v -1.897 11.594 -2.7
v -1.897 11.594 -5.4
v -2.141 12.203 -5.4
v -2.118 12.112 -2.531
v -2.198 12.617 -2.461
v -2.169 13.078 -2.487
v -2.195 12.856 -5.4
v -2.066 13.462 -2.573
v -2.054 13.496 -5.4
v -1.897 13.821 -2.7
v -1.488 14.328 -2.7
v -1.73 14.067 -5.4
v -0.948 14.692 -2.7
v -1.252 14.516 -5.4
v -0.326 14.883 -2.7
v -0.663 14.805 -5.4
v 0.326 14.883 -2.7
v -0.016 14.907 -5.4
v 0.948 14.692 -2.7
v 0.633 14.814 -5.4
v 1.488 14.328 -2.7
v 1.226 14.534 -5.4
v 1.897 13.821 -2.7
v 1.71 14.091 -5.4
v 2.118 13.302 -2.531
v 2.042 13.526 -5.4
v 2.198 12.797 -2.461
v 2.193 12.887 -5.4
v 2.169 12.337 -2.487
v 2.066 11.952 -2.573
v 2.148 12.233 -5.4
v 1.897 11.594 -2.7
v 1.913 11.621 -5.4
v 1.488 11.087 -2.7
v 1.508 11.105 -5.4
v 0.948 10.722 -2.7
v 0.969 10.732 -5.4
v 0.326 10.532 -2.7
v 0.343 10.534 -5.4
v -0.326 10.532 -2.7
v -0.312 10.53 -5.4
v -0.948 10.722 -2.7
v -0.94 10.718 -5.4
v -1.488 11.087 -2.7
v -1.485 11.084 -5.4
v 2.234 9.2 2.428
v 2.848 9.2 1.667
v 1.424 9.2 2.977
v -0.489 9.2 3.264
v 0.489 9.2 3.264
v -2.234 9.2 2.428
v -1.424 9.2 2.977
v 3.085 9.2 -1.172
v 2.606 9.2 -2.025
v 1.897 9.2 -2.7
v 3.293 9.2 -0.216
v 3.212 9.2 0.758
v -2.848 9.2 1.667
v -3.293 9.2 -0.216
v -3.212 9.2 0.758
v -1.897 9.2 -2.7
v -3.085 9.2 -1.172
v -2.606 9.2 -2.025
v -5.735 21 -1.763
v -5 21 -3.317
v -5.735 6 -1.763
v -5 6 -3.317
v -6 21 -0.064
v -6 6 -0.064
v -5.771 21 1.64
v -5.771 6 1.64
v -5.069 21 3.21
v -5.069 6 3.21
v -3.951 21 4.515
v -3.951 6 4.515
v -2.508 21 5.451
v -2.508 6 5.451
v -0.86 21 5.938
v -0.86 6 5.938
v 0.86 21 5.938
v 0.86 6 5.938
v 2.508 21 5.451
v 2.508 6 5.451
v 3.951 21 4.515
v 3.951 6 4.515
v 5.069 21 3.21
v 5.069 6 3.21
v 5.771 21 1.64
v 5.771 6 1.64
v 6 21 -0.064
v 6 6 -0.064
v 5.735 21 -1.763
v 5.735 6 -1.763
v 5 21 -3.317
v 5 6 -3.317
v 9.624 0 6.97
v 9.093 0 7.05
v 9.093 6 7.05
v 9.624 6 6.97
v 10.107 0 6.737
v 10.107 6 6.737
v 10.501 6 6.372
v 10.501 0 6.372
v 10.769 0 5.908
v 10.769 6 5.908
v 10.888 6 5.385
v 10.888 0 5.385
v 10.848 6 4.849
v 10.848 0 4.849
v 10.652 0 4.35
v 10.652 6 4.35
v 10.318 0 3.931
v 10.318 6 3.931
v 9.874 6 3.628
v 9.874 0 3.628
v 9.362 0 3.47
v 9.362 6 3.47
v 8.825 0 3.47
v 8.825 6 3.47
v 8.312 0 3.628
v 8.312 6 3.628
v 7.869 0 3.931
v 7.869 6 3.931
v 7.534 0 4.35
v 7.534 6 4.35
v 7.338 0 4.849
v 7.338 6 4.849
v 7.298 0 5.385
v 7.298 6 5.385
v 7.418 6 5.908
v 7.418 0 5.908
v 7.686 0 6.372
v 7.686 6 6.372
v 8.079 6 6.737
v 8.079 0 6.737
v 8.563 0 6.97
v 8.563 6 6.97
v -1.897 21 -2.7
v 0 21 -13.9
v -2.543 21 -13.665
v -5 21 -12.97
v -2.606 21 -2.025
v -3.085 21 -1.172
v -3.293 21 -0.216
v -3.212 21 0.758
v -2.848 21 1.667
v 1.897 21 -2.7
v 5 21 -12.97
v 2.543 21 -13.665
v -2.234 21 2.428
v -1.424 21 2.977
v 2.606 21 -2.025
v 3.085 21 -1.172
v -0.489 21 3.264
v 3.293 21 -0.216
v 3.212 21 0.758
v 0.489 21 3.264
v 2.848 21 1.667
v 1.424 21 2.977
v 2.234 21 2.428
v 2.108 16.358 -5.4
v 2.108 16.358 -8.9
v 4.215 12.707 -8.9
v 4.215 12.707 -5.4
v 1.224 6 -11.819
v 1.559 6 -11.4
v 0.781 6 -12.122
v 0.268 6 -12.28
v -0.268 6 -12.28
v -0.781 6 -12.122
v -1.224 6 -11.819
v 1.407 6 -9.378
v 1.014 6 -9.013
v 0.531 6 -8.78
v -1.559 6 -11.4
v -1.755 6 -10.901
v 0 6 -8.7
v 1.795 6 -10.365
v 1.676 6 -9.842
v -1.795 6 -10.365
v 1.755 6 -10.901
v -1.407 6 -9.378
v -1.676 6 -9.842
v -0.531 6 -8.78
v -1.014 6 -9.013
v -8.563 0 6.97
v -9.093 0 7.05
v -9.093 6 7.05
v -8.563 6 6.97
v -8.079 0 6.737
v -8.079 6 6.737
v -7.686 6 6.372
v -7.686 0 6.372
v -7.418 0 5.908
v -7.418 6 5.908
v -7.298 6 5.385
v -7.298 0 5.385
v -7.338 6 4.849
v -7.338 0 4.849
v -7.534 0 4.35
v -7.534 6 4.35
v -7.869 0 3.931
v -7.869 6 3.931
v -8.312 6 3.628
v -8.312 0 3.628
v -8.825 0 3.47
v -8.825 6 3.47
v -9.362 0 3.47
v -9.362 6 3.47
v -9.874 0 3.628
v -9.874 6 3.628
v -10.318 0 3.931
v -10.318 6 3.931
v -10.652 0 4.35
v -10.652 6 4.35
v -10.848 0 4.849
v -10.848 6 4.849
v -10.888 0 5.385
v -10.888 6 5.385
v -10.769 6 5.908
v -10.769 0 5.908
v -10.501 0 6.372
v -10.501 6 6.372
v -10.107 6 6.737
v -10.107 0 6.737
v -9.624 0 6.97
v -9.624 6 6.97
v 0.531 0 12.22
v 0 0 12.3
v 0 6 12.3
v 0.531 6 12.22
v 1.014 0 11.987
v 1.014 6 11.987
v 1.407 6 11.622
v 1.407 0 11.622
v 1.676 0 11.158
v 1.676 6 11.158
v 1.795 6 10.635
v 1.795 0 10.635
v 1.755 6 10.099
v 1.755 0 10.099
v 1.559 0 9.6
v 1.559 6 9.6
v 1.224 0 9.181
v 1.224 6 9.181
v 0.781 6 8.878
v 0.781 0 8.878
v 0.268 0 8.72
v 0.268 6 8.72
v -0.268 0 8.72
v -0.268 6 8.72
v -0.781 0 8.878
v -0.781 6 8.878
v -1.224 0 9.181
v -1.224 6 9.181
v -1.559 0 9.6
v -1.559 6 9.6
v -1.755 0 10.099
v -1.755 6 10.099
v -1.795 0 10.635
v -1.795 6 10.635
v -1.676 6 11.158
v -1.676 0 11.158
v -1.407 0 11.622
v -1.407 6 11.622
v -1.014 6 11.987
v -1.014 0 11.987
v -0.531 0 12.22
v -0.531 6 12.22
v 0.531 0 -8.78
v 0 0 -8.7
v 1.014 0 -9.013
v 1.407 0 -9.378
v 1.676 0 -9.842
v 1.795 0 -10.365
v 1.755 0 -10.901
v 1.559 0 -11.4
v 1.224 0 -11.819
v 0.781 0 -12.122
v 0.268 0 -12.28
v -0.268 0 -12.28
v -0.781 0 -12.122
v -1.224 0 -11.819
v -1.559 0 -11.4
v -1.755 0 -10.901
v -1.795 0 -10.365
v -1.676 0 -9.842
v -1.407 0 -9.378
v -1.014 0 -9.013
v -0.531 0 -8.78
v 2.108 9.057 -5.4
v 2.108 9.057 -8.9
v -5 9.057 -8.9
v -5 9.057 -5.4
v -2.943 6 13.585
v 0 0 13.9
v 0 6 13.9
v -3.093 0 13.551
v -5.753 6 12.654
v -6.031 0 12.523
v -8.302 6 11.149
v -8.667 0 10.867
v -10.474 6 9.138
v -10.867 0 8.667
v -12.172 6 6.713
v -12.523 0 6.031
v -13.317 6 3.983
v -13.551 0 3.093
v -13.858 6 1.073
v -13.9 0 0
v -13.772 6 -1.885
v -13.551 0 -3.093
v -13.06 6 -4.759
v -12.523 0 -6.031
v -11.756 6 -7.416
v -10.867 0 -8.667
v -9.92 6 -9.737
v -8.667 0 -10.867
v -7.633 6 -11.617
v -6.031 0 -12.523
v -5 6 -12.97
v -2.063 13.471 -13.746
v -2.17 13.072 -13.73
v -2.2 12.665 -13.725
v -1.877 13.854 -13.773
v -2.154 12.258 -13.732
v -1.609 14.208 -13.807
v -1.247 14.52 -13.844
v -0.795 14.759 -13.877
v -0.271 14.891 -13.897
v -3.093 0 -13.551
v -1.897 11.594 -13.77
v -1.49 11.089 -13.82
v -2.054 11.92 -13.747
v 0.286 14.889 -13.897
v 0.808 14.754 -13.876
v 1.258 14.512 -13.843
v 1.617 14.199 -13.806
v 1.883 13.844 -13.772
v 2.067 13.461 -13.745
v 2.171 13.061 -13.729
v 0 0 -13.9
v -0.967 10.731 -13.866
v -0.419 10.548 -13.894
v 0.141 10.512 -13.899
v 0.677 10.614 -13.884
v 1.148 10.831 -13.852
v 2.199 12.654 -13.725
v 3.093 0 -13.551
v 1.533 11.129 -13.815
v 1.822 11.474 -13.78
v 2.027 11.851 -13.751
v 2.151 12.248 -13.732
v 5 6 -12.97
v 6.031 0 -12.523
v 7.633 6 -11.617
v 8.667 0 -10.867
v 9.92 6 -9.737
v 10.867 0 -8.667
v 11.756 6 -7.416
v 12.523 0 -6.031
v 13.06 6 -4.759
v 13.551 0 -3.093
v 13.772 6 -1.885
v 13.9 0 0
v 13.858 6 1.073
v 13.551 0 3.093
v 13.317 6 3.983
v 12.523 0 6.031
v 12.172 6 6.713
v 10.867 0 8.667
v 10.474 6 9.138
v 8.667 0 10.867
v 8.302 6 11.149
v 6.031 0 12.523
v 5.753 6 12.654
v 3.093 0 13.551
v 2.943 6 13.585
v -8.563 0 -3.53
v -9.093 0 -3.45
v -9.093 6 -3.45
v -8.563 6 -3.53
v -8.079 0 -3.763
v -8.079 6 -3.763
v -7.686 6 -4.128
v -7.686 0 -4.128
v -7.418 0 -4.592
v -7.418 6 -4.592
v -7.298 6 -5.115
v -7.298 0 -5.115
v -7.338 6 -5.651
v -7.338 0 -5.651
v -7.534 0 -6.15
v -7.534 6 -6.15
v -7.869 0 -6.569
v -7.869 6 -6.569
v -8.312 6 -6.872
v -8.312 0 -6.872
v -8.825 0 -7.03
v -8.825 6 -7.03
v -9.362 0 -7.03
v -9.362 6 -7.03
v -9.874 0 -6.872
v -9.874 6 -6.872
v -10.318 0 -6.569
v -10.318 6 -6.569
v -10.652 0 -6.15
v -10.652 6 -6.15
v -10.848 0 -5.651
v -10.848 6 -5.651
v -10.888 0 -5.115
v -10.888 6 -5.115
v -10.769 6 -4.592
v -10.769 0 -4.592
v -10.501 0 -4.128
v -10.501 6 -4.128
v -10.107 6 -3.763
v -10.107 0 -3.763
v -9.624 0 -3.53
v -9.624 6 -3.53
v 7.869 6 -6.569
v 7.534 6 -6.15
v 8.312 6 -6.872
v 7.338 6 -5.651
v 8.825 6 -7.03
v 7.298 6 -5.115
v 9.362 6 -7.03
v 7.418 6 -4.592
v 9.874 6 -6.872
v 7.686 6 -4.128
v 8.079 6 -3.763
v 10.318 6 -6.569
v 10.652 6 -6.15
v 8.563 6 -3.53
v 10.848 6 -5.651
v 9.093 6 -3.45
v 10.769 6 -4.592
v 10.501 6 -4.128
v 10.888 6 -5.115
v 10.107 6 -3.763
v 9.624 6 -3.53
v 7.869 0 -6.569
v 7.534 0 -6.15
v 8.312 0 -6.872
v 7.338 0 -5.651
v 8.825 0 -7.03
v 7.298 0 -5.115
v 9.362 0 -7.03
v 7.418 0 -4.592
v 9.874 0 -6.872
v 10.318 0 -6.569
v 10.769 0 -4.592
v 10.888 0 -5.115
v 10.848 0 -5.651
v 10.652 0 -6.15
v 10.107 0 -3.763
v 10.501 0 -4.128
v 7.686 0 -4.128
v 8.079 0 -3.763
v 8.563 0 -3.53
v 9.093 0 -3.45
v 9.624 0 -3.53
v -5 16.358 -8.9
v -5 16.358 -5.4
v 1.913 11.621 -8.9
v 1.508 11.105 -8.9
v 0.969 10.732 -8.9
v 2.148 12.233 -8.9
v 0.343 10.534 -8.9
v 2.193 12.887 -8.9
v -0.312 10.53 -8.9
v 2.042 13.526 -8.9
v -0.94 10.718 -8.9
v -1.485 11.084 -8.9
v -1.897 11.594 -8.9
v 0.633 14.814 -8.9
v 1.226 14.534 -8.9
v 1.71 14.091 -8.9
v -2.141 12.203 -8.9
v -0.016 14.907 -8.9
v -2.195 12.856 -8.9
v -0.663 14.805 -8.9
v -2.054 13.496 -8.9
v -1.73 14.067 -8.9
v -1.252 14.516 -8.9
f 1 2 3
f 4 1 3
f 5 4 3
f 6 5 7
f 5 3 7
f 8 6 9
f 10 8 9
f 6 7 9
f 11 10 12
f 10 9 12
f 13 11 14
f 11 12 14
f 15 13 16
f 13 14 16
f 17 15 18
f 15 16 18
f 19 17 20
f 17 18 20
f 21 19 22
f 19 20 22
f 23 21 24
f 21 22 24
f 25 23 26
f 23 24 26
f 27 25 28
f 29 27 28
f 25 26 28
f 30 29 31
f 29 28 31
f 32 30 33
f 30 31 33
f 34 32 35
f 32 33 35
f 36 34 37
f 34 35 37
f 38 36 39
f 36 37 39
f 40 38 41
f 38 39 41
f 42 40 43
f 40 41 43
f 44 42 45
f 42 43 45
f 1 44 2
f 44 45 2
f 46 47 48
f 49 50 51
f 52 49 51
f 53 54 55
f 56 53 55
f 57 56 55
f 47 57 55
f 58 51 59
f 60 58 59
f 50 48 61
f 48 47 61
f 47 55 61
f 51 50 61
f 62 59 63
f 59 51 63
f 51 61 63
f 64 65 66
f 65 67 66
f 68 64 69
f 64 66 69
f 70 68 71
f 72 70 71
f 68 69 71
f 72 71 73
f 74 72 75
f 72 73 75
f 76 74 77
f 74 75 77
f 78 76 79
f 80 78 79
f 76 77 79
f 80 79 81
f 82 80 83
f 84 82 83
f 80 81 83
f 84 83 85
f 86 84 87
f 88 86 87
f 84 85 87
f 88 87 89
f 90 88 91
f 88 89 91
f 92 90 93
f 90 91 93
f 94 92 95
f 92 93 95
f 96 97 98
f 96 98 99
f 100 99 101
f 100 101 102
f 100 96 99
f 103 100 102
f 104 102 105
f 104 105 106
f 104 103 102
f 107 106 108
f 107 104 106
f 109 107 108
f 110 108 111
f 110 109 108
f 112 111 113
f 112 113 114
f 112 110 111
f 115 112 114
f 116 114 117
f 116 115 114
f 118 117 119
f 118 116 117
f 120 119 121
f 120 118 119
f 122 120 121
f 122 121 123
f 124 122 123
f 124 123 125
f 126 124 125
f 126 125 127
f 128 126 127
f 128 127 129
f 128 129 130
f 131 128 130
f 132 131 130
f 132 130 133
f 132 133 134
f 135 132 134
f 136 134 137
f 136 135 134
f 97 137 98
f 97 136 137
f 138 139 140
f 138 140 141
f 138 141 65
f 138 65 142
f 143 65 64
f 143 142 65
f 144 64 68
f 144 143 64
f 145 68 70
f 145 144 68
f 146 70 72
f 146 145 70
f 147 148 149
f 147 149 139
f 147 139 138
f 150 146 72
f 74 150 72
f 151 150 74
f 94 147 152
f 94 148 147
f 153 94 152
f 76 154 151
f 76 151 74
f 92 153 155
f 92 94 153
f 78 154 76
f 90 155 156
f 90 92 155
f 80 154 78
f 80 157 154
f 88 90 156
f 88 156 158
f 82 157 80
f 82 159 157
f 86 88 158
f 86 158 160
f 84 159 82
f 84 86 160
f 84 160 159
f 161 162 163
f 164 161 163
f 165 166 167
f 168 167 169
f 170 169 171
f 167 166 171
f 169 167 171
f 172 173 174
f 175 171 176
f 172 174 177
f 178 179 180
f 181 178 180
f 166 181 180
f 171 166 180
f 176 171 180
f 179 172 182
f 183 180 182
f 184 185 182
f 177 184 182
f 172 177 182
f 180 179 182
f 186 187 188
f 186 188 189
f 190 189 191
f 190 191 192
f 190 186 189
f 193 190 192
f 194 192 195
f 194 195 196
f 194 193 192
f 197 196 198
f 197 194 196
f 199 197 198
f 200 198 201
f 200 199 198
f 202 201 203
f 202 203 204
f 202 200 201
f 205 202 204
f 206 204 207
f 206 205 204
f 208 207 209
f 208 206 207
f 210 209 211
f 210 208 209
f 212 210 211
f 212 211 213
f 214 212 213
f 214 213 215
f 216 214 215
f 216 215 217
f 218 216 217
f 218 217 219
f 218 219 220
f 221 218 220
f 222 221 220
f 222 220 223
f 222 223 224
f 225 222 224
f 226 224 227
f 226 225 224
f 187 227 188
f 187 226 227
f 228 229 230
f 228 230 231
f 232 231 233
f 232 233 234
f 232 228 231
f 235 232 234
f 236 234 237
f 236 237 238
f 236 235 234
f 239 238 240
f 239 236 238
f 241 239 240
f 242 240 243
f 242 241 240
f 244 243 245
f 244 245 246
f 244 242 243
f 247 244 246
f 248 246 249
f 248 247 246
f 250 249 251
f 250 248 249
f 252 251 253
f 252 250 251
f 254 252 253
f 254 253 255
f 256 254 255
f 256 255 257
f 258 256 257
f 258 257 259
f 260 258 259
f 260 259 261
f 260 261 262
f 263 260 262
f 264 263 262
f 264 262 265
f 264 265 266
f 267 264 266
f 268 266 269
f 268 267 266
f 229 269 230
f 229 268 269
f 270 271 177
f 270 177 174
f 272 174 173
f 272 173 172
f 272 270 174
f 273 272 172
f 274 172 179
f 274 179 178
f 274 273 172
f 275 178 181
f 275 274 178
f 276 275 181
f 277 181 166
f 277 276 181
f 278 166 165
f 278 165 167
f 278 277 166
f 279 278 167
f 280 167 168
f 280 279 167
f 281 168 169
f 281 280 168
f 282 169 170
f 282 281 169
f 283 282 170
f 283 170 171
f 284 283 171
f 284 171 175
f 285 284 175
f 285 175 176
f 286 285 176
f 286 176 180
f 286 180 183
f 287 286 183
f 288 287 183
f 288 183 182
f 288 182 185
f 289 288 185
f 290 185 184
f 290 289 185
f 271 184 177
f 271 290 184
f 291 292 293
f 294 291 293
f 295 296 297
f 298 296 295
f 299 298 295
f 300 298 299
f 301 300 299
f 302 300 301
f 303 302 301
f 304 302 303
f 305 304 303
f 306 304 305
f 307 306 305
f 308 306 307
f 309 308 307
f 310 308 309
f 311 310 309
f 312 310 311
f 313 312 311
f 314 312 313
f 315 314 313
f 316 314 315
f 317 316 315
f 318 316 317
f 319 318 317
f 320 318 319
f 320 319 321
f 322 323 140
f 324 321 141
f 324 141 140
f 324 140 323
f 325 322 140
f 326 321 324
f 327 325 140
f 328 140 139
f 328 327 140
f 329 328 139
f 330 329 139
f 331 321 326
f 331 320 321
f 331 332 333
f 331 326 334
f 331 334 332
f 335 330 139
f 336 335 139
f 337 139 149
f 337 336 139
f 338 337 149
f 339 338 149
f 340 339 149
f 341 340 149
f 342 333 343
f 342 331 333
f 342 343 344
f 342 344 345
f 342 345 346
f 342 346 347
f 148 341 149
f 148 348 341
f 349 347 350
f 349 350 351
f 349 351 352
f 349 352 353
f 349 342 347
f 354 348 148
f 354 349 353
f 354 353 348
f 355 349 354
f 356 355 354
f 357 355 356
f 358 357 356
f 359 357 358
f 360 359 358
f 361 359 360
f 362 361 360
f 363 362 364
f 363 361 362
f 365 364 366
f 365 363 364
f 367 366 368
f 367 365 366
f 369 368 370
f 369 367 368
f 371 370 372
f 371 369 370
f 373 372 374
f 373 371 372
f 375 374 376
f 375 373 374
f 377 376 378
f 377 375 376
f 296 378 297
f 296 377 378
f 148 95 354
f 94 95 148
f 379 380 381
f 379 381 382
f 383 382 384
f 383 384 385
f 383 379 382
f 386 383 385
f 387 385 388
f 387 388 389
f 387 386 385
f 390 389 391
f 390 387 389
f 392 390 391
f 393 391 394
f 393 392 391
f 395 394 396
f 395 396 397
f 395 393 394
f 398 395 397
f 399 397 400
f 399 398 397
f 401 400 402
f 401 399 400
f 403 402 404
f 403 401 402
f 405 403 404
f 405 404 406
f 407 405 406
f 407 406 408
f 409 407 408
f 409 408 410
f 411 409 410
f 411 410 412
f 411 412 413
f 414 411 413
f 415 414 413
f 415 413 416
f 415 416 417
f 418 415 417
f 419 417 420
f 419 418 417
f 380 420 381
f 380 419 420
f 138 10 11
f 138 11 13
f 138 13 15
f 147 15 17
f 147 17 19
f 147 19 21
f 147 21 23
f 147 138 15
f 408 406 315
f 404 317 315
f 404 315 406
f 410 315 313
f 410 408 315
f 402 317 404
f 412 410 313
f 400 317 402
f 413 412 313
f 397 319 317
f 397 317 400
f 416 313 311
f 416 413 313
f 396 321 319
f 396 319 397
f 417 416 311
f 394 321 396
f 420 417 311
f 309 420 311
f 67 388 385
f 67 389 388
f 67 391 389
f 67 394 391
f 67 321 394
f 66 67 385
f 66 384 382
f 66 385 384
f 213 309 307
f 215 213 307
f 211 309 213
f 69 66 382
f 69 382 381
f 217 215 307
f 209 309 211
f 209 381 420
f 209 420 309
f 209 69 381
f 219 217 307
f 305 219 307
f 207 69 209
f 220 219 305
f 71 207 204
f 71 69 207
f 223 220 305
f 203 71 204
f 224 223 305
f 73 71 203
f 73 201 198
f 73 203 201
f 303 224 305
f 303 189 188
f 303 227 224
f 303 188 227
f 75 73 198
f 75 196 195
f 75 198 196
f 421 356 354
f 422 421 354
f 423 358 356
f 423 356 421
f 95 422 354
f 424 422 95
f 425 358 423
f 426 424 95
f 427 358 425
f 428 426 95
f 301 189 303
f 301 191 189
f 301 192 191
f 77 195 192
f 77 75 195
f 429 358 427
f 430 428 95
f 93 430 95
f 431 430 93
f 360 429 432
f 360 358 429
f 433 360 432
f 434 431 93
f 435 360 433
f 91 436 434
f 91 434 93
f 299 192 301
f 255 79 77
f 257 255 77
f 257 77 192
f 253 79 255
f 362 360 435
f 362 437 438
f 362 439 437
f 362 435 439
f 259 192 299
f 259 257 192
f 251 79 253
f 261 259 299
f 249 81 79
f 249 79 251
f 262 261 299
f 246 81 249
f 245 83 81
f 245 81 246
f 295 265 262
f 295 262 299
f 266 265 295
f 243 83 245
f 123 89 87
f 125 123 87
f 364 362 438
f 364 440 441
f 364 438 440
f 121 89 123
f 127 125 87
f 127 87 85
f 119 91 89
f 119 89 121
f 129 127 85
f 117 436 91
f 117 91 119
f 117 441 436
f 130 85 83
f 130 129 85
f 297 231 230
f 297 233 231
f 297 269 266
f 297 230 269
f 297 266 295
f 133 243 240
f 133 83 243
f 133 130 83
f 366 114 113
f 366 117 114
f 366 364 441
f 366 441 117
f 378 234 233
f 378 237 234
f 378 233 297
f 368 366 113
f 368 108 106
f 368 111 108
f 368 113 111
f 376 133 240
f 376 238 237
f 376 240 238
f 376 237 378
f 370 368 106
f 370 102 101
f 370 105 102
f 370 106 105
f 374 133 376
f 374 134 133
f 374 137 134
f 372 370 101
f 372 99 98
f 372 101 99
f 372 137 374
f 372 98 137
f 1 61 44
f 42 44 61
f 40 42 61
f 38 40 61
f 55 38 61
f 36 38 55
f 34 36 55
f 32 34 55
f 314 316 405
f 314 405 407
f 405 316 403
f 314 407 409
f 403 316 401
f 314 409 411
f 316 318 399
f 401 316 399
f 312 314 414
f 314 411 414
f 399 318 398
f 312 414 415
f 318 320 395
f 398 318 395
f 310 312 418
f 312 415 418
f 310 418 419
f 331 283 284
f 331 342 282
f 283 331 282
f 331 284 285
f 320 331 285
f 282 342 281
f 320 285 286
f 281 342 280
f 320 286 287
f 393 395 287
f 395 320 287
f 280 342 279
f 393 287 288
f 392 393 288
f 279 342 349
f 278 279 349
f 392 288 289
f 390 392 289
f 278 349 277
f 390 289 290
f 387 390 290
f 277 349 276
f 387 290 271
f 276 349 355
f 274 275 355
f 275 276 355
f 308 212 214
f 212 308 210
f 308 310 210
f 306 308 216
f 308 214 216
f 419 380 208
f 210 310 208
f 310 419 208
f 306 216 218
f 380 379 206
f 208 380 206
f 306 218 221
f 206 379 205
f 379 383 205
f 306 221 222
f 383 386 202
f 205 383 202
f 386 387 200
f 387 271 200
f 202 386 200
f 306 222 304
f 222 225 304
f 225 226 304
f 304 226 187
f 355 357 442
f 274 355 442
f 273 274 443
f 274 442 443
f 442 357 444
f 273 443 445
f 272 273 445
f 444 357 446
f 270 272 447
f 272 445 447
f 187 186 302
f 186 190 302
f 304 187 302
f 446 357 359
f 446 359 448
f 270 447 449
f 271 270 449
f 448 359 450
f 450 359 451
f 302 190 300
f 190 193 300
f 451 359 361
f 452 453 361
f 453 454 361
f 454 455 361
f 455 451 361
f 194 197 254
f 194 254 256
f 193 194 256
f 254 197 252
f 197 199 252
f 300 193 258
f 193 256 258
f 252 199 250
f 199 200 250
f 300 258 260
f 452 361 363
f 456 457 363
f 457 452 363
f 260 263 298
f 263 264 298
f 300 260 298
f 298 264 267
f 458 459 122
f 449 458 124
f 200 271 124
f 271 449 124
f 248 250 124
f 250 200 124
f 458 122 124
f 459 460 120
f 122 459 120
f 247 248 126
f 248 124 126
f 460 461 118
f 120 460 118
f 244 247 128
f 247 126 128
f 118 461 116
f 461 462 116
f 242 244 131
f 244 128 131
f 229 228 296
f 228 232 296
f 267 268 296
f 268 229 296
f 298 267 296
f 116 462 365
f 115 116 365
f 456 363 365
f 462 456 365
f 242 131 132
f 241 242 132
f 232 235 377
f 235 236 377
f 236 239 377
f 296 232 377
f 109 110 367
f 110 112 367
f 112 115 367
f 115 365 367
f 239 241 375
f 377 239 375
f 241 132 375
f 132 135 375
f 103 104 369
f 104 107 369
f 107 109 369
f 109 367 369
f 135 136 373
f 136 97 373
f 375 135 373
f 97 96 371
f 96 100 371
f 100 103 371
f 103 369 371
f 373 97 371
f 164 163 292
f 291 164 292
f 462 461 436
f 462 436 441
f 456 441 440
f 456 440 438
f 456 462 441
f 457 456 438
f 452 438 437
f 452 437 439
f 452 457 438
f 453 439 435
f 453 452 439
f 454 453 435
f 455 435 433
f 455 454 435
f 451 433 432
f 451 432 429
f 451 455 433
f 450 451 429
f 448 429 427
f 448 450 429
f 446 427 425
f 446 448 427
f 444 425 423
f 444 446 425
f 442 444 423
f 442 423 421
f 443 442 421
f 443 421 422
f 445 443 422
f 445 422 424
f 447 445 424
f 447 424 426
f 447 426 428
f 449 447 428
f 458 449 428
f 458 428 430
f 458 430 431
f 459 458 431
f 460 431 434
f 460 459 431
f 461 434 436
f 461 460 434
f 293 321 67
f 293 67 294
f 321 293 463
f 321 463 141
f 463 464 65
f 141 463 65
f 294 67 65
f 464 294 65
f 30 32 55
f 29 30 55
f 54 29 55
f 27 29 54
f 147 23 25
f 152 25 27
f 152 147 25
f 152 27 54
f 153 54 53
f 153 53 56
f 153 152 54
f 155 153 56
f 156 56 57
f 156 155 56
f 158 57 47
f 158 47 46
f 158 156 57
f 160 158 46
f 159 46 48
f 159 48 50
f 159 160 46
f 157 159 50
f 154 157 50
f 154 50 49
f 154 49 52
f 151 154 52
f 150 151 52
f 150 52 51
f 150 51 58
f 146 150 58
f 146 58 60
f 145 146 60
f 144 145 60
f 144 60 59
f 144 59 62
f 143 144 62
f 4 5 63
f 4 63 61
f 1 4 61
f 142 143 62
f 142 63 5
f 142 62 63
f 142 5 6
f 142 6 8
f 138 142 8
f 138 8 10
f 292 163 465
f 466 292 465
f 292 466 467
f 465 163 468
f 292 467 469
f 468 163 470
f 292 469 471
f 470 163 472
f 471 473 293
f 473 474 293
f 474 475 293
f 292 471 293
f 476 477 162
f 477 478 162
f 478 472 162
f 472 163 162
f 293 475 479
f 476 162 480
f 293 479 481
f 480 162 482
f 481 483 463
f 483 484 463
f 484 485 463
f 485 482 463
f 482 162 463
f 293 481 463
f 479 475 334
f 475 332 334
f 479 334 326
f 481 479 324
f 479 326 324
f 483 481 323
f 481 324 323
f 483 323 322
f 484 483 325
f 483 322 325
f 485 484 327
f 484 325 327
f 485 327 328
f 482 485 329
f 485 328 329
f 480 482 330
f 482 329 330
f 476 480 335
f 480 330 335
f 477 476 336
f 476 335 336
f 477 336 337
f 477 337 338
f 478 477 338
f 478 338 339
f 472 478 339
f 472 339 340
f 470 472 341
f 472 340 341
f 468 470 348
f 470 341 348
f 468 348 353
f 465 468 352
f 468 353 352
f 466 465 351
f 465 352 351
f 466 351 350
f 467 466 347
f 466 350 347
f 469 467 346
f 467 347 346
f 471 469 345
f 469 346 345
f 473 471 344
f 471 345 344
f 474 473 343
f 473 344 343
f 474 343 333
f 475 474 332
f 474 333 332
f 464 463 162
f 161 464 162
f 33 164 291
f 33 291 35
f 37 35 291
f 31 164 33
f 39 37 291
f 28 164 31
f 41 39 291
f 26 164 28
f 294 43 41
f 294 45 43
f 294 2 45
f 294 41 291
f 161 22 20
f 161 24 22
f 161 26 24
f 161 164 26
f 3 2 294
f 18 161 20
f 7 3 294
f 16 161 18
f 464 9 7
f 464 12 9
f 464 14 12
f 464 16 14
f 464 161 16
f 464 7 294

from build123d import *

# Parameters (mm, degrees)
ESQUISSE3_R             = 13.9
ESQUISSE3_R_2           = 1.8
BOSS_EXTRU_1_DEPTH      = 6
ESQUISSE5_R             = 6
BOSS_EXTRU_2_DEPTH      = 15
ENL_V_MAT_EXTRU_2_DEPTH = 11.8
BOSS_EXTRU_3_REACH      = 37.097
BOSS_EXTRU_3_END_RADIUS = 13.9
BOSS_EXTRU_3_START      = -3
ESQUISSE7_W             = 10
ESQUISSE7_H             = 15
ESQUISSE11_R            = 2.2
ENL_V_MAT_EXTRU_3_DEPTH = 14
ENL_V_START             = -5
ENL_V_MAT_EXTRU_4_DEPTH = 3.5


with BuildPart() as part:
    # Esquisse3 → Boss.-Extru.1 (new body)
    with BuildSketch(Plane(origin=(0, 0, 0), x_dir=(1, 0, 0), z_dir=(0, 1, 0))):
        with Locations(Location((0, 0, 0), (0, 0, 270))):
            Circle(ESQUISSE3_R)
        with Locations(Location((0, 10.5, 0), (0, 0, 270))):
            Circle(ESQUISSE3_R_2, mode=Mode.SUBTRACT)
        with Locations(Location((9.09326674, 5.25, 0), (0, 0, 270))):
            Circle(ESQUISSE3_R_2, mode=Mode.SUBTRACT)
        with Locations(Location((9.09326674, -5.25, 0), (0, 0, 270))):
            Circle(ESQUISSE3_R_2, mode=Mode.SUBTRACT)
        with Locations(Location((0, -10.5, 0), (0, 0, 270))):
            Circle(ESQUISSE3_R_2, mode=Mode.SUBTRACT)
        with Locations(Location((-9.09326674, -5.25, 0), (0, 0, 270))):
            Circle(ESQUISSE3_R_2, mode=Mode.SUBTRACT)
        with Locations(Location((-9.09326674, 5.25, 0), (0, 0, 270))):
            Circle(ESQUISSE3_R_2, mode=Mode.SUBTRACT)
    extrude(amount=BOSS_EXTRU_1_DEPTH)

    # Esquisse5 → Boss.-Extru.2 (add)
    with BuildSketch(Plane(origin=(0, 6, 0), x_dir=(1, 0, 0), z_dir=(0, 1, 0))):
        with Locations(Location((0, 0, 0), (0, 0, 270))):
            Circle(ESQUISSE5_R)
    extrude(amount=BOSS_EXTRU_2_DEPTH)

    # Esquisse6 → Enlèv. mat.-Extru.2 (cut)
    with BuildSketch(Plane(origin=(0, 21, 0), x_dir=(1, 0, 0), z_dir=(0, 1, 0))):
        with BuildLine():
            Line((-1.897366596, 2.7), (1.897366596, 2.7))
            ThreePointArc((1.897366596, 2.7), (0, -3.3), (-1.897366596, 2.7))
        make_face()
    extrude(amount=-ENL_V_MAT_EXTRU_2_DEPTH, mode=Mode.SUBTRACT)

    # Boss.-Extru.3: up to this cylinder (the profile starts inside it)
    boss_extru_3_end = Plane(origin=(0, 13.5, 0), z_dir=(0, -1, 0)) * Cylinder(BOSS_EXTRU_3_END_RADIUS, 102.994, mode=Mode.PRIVATE)
    # Esquisse7 → Boss.-Extru.3 (add, up to the surface)
    with BuildSketch(Plane(origin=(0, 0, -6), x_dir=(-1, 0, 0), z_dir=(0, 0, -1)).offset(BOSS_EXTRU_3_START), mode=Mode.PRIVATE) as boss_extru_3_sk1:
        with Locations((0, 13.5)):
            Rectangle(ESQUISSE7_W, ESQUISSE7_H)
    boss_extru_3_tool1 = extrude(boss_extru_3_sk1.sketch, amount=BOSS_EXTRU_3_REACH, mode=Mode.PRIVATE) & boss_extru_3_end
    add(boss_extru_3_tool1.solids().sort_by_distance((0, 13.5, -3))[0])

    # Esquisse11 → Enlèv. mat.-Extru.3 (cut)
    with BuildSketch(Plane(origin=(0, 0, -13.9), x_dir=(-1, 0, 0), z_dir=(0, 0, -1))):
        with Locations(Location((0, 12.707359669, 0), (0, 0, 329.591587588))):
            Circle(ESQUISSE11_R)
    extrude(amount=-ENL_V_MAT_EXTRU_3_DEPTH, mode=Mode.SUBTRACT)

    # Esquisse12 → Enlèv. mat.-Extru.4 (cut)
    with BuildSketch(Plane(origin=(0, 0, -13.9), x_dir=(-1, 0, 0), z_dir=(0, 0, -1)).offset(ENL_V_START)):
        Polygon((0, 16.357656746), (-2.1075, 16.357656746), (-4.215, 12.707359669), (-2.1075, 9.057062592), (2.1075, 9.057062592), (5, 9.057062592), (5, 16.357656746), align=None)
    extrude(amount=-ENL_V_MAT_EXTRU_4_DEPTH, mode=Mode.SUBTRACT)


solid = part.part
